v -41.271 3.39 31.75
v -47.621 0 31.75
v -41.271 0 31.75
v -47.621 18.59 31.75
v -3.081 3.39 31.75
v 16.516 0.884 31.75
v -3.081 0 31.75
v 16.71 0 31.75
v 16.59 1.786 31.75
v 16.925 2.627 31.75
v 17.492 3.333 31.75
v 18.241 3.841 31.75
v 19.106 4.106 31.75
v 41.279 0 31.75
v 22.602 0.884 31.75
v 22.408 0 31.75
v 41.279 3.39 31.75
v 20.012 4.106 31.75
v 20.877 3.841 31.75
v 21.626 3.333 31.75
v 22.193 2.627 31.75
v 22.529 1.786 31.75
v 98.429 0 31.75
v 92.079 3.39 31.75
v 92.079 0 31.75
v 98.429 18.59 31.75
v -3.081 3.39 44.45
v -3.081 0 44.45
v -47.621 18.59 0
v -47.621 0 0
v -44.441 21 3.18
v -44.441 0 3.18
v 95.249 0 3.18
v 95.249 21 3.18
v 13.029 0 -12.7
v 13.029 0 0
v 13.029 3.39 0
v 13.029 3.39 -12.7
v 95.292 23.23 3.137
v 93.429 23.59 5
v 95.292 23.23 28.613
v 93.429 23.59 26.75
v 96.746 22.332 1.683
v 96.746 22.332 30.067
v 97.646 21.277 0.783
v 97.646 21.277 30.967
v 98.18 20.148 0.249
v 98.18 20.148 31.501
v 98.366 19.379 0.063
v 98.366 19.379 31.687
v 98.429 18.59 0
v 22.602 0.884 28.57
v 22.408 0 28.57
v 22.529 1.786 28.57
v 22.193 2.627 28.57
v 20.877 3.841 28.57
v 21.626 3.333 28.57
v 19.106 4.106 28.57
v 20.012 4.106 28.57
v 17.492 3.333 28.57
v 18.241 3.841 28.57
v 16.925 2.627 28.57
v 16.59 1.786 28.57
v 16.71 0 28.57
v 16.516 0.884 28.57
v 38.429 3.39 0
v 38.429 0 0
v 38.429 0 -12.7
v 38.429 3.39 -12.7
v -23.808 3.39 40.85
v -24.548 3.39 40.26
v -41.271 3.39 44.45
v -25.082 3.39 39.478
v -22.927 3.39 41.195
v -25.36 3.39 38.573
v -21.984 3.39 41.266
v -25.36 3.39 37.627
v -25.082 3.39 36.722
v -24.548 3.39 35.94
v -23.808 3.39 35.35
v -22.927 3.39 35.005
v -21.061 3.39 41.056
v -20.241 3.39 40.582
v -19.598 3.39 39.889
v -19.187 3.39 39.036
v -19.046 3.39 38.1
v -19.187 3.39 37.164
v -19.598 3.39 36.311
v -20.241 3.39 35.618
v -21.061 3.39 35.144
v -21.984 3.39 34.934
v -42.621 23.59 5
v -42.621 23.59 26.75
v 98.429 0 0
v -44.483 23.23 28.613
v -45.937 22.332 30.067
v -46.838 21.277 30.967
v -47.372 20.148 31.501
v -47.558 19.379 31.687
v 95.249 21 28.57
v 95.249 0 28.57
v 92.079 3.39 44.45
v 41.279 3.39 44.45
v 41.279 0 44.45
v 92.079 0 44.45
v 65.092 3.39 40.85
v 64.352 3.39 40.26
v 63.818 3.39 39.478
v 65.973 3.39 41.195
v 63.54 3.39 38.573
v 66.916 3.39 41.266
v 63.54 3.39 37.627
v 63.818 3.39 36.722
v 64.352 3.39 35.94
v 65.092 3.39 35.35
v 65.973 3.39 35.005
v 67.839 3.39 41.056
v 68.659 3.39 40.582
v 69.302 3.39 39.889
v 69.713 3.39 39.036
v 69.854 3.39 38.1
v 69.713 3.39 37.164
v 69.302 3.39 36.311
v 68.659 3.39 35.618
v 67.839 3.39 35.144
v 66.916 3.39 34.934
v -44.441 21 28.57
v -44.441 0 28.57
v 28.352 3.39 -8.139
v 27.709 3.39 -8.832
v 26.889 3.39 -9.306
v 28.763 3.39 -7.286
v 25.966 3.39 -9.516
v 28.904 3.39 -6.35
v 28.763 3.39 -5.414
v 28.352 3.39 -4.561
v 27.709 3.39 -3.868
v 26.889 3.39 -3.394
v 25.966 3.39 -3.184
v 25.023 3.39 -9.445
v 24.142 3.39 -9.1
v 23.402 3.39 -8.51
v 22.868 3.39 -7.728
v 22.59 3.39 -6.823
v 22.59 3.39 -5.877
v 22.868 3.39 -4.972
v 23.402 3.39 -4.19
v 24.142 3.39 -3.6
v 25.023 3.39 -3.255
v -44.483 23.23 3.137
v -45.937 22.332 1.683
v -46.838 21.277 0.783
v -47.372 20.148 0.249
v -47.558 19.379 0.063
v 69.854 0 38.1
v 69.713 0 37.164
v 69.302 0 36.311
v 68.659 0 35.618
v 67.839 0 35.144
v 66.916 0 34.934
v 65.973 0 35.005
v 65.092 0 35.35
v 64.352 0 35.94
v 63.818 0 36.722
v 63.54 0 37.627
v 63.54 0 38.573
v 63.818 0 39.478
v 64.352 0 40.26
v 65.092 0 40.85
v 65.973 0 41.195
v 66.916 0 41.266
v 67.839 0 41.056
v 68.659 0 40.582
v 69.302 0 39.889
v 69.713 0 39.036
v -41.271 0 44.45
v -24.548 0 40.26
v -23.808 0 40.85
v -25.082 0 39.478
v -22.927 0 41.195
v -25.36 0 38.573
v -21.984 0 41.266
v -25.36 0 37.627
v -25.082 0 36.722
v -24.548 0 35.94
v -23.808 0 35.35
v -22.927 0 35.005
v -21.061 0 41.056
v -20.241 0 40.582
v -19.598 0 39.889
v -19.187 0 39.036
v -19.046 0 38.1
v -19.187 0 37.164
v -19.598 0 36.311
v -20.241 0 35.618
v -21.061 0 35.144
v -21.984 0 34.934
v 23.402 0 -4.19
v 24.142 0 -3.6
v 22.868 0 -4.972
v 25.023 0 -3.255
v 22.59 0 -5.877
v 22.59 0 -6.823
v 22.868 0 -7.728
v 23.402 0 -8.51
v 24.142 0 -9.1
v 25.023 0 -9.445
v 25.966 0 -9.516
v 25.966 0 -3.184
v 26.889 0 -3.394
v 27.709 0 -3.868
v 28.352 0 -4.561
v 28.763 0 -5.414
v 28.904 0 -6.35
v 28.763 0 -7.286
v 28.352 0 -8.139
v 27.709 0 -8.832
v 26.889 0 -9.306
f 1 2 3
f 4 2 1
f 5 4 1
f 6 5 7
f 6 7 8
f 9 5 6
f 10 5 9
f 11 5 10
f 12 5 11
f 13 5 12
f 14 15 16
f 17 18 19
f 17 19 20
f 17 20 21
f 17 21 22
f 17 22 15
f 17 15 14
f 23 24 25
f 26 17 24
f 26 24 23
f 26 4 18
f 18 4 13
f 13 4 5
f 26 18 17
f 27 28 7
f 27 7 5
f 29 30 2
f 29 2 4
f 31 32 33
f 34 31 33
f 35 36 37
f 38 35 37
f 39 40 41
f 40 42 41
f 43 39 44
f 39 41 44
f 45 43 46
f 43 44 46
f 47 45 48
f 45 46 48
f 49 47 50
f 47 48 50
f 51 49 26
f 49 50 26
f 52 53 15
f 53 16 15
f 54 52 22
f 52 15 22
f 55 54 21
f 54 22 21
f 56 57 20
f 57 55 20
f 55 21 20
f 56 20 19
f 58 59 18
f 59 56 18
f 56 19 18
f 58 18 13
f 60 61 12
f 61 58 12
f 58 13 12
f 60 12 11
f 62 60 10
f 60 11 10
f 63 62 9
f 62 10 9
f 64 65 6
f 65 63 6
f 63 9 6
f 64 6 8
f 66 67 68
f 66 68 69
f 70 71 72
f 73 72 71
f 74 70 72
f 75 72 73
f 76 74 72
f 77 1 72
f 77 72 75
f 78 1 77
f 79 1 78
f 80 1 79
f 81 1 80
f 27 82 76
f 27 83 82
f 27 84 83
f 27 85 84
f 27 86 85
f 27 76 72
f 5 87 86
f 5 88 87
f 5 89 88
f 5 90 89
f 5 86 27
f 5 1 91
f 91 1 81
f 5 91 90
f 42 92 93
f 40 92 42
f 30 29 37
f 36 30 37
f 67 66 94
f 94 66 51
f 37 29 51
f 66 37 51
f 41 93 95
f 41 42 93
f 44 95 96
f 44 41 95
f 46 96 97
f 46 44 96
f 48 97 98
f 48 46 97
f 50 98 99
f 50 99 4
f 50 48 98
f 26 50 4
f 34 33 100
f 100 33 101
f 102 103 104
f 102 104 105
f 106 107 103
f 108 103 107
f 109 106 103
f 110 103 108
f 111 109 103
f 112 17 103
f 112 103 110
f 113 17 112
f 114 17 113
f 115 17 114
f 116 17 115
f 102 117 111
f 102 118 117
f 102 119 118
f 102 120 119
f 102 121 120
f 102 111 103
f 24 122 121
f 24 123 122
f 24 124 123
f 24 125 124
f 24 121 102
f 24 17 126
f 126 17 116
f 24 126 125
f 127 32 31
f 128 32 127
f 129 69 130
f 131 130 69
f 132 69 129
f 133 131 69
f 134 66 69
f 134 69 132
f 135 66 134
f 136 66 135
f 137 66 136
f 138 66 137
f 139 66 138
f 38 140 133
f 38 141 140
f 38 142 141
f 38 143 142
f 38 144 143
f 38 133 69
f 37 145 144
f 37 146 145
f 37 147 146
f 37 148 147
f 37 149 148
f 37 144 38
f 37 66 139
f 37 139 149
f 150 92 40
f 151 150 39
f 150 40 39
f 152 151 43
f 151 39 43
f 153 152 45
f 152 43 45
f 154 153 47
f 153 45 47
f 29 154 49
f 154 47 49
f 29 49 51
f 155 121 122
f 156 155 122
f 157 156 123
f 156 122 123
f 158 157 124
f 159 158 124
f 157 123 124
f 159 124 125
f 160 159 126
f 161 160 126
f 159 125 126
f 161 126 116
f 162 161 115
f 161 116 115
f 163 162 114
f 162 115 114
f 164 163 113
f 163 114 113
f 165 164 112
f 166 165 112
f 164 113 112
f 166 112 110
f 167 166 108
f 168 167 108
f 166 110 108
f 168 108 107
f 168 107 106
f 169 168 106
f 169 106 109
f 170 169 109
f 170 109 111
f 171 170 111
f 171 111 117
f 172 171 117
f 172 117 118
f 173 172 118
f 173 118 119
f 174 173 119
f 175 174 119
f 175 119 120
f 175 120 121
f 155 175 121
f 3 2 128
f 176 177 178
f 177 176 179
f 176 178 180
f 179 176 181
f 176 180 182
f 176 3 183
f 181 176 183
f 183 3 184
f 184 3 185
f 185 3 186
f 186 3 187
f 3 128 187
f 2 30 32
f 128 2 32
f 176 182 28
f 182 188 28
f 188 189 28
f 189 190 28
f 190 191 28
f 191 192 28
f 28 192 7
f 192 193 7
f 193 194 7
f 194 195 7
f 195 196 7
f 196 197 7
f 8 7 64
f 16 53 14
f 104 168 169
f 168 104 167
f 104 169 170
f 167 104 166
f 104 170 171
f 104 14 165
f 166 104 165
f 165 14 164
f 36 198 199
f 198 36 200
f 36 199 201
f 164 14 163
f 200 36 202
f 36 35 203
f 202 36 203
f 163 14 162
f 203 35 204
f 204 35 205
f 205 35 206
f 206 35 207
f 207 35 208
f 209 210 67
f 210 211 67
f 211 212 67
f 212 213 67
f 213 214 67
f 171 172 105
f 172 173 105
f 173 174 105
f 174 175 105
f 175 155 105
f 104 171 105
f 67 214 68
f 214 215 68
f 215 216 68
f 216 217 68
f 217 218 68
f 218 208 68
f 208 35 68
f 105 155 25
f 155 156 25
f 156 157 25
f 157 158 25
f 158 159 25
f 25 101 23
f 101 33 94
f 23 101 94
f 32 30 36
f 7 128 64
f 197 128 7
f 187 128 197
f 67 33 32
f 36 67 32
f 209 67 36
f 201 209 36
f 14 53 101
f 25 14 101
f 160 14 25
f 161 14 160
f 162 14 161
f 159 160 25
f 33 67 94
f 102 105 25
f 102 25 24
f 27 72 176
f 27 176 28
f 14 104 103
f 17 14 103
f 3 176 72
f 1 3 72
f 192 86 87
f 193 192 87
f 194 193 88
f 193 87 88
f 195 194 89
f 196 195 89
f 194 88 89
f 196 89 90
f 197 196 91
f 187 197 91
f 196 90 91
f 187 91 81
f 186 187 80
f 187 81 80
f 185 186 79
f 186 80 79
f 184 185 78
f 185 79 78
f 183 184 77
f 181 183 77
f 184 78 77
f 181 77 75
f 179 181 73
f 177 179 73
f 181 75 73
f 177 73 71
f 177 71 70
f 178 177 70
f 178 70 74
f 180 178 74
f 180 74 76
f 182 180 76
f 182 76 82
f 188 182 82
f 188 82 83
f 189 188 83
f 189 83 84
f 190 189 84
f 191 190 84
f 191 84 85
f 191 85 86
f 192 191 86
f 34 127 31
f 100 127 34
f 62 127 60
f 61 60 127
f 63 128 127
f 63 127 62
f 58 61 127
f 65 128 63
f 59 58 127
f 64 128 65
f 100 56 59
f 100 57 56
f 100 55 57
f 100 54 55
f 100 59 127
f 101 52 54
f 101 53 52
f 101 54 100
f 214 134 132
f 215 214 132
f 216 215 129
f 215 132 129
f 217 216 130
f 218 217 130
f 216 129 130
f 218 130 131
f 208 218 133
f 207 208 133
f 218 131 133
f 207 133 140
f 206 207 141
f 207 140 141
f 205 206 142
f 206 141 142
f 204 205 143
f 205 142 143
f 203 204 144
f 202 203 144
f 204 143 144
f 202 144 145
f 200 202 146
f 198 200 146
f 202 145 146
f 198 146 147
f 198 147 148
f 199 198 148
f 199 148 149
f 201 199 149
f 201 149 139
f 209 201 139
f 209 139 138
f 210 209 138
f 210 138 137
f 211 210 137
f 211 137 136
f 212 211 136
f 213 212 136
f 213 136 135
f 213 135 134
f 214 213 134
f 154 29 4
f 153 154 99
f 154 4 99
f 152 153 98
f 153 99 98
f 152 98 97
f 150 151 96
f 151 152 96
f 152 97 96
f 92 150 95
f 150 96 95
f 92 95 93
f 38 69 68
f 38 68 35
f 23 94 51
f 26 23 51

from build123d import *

# Parameters (mm, degrees)
SKETCH1_W           = 146.05
SKETCH1_H           = 23.59
BOSS_EXTRUDE1_DEPTH = 31.75
SKETCH2_W           = 139.69
SKETCH2_H           = 25.39
CUT_EXTRUDE1_DEPTH  = 21
FILLET1_R           = 5
SKETCH3_R           = 3.05
CUT_EXTRUDE2_DEPTH  = 3.18
SKETCH4_W           = 38.19
SKETCH4_H           = 3.39
SKETCH4_W_2         = 50.8
BOSS_EXTRUDE2_DEPTH = 12.7
SKETCH5_W           = 25.4
SKETCH5_H           = 3.39
BOSS_EXTRUDE3_DEPTH = 12.7
SKETCH6_R           = 3.175
CUT_EXTRUDE3_DEPTH  = 12.7
SKETCH7_R           = 3.175
CUT_EXTRUDE4_DEPTH  = 12.7


with BuildPart() as part:
    # Sketch1 → Boss-Extrude1 (new body)
    with BuildSketch(Plane.XY):
        with Locations((25.404065421, 11.795)):
            Rectangle(SKETCH1_W, SKETCH1_H)
    extrude(amount=BOSS_EXTRUDE1_DEPTH)

    # Sketch2 → Cut-Extrude1 (cut)
    with BuildSketch(Plane.XZ):
        with Locations((25.404065421, 15.875)):
            Rectangle(SKETCH2_W, SKETCH2_H)
    extrude(amount=-CUT_EXTRUDE1_DEPTH, mode=Mode.SUBTRACT)

    # Fillet1
    fillet1_edges = [part.edges().sort_by_distance(p)[0] for p in [
        (25.404065421, 23.59, 31.75),
        (25.404065421, 23.59, 0),
        (-47.620934579, 23.59, 15.875),
        (98.429065421, 23.59, 15.875),
    ]]
    fillet(fillet1_edges, radius=FILLET1_R)

    # Sketch3 → Cut-Extrude2 (cut)
    with BuildSketch(Plane.XY.offset(31.75)):
        with Locations((19.559065421, 1.09)):
            Circle(SKETCH3_R)
    extrude(amount=-CUT_EXTRUDE2_DEPTH, mode=Mode.SUBTRACT)

    # Sketch4 → Boss-Extrude2 (add)
    with BuildSketch(Plane.XY.offset(31.75)):
        with Locations((-22.175934579, 1.695)):
            Rectangle(SKETCH4_W, SKETCH4_H)
        with Locations((66.679065421, 1.695)):
            Rectangle(SKETCH4_W_2, SKETCH4_H)
    extrude(amount=BOSS_EXTRUDE2_DEPTH)

    # Sketch5 → Boss-Extrude3 (add)
    with BuildSketch(Plane(origin=(0, 0, 0), x_dir=(-1, 0, 0), z_dir=(0, 0, -1))):
        with Locations((-25.729065421, 1.695)):
            Rectangle(SKETCH5_W, SKETCH5_H)
    extrude(amount=BOSS_EXTRUDE3_DEPTH)

    # Sketch6 → Cut-Extrude3 (cut)
    with BuildSketch(Plane(origin=(0, 3.39, 0), x_dir=(1, 0, 0), z_dir=(0, 1, 0))):
        with Locations((-22.220934579, -38.1)):
            Circle(SKETCH6_R)
        with Locations((66.679065421, -38.1)):
            Circle(SKETCH6_R)
    extrude(amount=-CUT_EXTRUDE3_DEPTH, mode=Mode.SUBTRACT)

    # Sketch7 → Cut-Extrude4 (cut)
    with BuildSketch(Plane(origin=(0, 3.39, 0), x_dir=(1, 0, 0), z_dir=(0, 1, 0))):
        with Locations((25.729065421, 6.35)):
            Circle(SKETCH7_R)
    extrude(amount=-CUT_EXTRUDE4_DEPTH, mode=Mode.SUBTRACT)


solid = part.part
